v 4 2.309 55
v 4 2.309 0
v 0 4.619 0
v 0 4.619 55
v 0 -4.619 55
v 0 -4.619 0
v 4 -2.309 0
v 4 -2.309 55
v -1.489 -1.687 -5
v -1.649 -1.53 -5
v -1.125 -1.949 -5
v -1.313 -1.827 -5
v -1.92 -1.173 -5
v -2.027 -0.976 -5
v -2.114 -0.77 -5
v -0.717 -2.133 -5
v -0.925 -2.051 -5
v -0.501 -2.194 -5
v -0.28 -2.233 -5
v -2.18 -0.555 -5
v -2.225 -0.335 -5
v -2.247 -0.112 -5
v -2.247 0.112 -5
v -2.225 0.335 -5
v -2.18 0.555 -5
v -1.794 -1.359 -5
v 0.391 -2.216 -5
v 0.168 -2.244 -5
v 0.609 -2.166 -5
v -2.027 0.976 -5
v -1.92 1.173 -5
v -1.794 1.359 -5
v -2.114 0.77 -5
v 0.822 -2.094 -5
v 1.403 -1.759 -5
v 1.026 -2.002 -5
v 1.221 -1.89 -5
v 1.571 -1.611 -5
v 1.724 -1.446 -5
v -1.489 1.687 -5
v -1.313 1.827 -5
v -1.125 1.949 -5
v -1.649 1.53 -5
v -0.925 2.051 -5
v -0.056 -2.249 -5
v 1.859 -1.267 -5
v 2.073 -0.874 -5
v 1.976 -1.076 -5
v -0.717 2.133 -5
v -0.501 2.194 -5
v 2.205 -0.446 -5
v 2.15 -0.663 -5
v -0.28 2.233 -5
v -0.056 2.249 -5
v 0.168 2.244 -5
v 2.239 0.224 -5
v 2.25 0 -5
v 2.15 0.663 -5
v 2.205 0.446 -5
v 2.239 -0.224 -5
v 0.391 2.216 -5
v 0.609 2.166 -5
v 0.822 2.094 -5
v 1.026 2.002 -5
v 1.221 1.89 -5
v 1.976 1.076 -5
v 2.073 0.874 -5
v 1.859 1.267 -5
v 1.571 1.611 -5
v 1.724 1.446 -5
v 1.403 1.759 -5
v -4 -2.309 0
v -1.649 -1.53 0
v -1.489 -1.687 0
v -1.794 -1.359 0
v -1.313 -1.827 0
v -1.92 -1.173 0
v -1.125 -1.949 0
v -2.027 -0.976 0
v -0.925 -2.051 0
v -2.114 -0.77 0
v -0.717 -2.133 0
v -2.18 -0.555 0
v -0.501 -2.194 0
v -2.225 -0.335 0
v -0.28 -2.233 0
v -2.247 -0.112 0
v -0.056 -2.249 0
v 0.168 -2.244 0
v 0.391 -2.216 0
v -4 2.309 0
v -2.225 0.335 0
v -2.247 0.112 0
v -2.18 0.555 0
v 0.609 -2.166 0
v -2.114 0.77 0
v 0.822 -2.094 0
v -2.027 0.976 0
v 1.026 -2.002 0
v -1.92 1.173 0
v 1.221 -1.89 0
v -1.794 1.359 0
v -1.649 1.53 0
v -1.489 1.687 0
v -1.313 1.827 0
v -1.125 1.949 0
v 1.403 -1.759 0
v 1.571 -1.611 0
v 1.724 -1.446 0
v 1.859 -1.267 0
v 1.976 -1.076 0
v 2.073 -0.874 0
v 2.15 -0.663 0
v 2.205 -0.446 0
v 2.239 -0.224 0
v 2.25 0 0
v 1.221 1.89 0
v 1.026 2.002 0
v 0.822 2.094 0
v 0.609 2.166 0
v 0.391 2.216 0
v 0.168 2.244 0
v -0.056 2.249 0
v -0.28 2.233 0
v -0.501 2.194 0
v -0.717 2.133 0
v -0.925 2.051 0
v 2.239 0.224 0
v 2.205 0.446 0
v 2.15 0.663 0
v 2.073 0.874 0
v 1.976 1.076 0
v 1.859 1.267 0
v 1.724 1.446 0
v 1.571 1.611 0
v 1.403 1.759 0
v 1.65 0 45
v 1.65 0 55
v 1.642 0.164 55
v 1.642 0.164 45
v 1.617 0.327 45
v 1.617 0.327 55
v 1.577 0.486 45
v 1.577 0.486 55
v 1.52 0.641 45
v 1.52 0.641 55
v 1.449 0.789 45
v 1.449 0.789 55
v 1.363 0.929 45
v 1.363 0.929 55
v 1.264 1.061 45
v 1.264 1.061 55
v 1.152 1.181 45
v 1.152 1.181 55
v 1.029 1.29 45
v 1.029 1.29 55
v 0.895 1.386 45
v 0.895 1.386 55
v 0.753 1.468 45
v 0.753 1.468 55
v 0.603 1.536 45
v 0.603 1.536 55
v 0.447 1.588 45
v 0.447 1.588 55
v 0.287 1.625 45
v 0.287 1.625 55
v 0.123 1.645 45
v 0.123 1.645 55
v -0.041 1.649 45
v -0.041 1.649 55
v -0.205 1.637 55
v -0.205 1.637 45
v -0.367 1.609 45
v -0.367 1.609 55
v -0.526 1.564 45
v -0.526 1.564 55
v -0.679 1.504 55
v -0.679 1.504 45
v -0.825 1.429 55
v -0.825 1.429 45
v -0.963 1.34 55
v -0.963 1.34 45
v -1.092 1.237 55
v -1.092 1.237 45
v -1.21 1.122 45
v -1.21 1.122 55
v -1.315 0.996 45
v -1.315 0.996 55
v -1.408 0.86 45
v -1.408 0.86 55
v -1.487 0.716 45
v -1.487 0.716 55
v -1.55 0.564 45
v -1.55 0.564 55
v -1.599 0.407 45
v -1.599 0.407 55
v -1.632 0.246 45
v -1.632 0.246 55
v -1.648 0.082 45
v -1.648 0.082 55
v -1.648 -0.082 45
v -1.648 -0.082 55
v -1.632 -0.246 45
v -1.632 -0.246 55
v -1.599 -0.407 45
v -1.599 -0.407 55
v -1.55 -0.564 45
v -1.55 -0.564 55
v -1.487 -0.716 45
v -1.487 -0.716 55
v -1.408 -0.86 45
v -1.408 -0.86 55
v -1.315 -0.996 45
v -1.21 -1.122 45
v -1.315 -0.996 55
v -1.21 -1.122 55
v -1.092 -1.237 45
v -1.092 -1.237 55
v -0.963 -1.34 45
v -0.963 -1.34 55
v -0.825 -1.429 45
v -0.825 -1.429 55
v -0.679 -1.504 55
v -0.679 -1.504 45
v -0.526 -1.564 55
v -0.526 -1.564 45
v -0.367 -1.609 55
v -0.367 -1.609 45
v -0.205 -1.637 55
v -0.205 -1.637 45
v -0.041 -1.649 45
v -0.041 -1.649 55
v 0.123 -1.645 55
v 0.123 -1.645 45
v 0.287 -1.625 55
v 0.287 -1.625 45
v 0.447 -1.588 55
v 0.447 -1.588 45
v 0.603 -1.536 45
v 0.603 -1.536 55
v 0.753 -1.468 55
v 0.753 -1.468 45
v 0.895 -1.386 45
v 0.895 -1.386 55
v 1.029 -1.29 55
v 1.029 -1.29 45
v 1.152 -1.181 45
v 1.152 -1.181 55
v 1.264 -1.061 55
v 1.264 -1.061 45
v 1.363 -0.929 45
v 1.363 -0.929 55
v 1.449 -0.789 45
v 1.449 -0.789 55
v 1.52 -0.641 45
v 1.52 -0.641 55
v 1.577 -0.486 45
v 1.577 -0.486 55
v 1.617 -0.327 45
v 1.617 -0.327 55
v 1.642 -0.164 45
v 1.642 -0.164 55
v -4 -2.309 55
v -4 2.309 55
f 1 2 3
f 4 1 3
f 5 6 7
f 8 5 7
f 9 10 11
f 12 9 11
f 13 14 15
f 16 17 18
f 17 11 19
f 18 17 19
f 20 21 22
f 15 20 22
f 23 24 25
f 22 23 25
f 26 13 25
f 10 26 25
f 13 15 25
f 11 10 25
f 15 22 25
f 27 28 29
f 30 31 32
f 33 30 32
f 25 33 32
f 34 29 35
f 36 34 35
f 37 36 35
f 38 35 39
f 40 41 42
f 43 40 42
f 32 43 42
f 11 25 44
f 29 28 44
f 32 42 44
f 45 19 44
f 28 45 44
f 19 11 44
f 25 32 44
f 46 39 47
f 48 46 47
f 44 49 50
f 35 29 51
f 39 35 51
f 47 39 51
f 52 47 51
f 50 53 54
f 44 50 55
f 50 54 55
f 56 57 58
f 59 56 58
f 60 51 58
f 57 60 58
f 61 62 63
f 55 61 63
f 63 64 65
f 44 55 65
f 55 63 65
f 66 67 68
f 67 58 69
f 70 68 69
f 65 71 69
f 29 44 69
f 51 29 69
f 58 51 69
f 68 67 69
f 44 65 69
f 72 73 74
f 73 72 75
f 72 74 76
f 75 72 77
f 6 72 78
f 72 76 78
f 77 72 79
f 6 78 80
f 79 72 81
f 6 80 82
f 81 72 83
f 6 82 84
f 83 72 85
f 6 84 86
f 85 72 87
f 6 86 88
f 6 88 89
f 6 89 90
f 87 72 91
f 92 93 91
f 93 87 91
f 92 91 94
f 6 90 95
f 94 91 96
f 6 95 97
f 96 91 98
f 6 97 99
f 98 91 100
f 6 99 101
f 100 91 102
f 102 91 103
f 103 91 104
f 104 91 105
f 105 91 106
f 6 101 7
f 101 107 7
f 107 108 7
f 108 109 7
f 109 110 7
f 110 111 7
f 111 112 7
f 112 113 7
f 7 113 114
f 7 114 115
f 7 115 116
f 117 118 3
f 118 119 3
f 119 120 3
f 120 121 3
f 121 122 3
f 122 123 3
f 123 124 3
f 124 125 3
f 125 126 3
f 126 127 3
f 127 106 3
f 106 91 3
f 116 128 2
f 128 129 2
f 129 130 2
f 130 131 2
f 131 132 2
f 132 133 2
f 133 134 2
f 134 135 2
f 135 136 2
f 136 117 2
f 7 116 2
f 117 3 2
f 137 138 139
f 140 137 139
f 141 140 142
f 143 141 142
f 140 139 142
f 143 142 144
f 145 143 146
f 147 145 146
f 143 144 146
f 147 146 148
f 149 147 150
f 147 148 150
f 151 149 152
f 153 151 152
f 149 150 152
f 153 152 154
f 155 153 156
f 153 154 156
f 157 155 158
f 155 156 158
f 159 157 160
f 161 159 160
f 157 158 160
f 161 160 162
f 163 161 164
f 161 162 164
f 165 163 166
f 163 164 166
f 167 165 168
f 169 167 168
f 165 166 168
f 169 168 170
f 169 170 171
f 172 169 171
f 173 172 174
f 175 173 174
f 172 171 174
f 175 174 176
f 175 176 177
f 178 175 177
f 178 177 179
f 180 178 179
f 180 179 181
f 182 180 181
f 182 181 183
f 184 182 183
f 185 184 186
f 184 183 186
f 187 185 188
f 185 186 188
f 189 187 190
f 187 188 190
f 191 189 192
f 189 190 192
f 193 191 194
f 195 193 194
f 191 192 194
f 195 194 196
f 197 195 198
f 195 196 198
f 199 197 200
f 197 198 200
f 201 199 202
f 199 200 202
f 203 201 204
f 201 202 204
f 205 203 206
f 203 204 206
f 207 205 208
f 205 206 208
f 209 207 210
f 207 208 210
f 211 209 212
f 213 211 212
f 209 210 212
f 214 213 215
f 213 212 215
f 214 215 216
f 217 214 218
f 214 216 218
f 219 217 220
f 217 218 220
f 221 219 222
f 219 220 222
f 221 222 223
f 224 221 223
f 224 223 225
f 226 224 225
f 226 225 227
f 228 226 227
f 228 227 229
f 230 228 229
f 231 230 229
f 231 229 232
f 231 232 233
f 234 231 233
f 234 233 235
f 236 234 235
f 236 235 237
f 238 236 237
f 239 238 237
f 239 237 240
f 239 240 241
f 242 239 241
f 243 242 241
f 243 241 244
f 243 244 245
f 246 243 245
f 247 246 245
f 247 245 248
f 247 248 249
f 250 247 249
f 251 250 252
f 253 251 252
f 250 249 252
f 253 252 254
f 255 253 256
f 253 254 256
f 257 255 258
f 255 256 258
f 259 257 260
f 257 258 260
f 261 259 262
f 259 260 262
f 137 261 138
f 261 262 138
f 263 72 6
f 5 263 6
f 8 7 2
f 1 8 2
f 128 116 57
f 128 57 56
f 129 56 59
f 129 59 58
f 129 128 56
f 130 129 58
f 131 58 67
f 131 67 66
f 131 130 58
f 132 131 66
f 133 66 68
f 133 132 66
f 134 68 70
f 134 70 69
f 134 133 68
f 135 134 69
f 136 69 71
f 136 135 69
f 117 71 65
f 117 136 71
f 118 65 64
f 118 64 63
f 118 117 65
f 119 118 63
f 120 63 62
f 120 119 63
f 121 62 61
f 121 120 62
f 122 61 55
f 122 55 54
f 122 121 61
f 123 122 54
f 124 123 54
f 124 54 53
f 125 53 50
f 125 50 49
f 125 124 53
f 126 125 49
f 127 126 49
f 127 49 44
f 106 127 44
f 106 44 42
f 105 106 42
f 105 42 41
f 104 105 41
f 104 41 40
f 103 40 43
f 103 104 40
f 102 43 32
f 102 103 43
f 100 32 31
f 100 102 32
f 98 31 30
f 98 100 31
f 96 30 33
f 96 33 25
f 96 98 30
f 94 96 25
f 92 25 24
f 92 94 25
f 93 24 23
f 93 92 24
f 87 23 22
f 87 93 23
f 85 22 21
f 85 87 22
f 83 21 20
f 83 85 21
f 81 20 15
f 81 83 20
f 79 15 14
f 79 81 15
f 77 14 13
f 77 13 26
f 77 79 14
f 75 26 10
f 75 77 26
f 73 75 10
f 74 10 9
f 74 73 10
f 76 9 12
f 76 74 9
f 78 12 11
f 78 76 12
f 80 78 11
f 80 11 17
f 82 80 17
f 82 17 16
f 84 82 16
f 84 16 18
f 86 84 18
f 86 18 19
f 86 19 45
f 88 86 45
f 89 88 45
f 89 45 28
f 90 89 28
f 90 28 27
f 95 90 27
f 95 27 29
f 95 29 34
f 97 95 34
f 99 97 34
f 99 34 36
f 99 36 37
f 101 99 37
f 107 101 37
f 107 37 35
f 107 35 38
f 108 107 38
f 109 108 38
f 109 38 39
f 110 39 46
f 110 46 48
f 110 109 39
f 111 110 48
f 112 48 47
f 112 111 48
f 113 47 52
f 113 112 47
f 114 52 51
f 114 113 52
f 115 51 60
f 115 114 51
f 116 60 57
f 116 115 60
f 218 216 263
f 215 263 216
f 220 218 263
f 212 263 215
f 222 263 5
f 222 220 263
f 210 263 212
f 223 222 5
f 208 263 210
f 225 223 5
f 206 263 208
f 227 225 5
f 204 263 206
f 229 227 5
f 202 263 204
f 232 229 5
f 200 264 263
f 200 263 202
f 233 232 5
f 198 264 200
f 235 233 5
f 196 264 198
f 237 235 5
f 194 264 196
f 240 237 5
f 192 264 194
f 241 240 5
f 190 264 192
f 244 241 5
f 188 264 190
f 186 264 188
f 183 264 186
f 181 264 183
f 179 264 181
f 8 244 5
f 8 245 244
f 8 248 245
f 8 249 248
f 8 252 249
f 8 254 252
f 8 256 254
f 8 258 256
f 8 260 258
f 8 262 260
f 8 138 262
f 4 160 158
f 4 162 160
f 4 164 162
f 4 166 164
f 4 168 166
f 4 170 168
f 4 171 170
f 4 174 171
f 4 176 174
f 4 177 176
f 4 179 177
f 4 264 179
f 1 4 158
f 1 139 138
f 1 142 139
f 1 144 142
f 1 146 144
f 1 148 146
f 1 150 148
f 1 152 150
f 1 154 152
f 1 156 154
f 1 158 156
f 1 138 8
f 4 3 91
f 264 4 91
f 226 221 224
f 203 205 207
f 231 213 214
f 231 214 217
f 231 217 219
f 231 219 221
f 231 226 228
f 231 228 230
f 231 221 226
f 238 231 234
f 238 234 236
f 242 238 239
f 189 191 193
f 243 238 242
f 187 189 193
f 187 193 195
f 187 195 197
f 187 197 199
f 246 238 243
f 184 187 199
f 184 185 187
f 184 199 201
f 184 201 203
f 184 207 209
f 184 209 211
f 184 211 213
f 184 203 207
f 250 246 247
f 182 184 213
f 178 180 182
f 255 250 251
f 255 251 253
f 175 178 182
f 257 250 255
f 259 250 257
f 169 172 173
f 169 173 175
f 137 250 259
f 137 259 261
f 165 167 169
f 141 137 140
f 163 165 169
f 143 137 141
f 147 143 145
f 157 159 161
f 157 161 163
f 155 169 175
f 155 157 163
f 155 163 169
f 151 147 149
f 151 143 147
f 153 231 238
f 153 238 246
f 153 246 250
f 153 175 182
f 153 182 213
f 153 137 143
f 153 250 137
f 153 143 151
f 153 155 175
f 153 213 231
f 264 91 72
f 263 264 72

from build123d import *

# Parameters (mm, degrees)
F0_R     = 2.25
F1_DEPTH = 55
F2_DEPTH = 5
F3_R     = 1.65
F4_DEPTH = 10


with BuildPart() as f1:
    # F0 (on Top) → F1 (new body)
    with BuildSketch(Plane.XY):
        Polygon((4, -2.309401), (4, 2.309401), (0, 4.618802), (-4, 2.309401), (-4, -2.309401), (0, -4.618802), align=None)
        Circle(F0_R, mode=Mode.SUBTRACT)
        Circle(F0_R)
    extrude(amount=F1_DEPTH)

    # F0 (on Top) → F2 (join)
    with BuildSketch(Plane.XY):
        Circle(F0_R)
    extrude(amount=-F2_DEPTH)

    # F3 (on face) → F4 (cut)
    with BuildSketch(Plane.XY.offset(55)):
        Circle(F3_R)
    extrude(amount=-F4_DEPTH, mode=Mode.SUBTRACT)


solid = f1.part
